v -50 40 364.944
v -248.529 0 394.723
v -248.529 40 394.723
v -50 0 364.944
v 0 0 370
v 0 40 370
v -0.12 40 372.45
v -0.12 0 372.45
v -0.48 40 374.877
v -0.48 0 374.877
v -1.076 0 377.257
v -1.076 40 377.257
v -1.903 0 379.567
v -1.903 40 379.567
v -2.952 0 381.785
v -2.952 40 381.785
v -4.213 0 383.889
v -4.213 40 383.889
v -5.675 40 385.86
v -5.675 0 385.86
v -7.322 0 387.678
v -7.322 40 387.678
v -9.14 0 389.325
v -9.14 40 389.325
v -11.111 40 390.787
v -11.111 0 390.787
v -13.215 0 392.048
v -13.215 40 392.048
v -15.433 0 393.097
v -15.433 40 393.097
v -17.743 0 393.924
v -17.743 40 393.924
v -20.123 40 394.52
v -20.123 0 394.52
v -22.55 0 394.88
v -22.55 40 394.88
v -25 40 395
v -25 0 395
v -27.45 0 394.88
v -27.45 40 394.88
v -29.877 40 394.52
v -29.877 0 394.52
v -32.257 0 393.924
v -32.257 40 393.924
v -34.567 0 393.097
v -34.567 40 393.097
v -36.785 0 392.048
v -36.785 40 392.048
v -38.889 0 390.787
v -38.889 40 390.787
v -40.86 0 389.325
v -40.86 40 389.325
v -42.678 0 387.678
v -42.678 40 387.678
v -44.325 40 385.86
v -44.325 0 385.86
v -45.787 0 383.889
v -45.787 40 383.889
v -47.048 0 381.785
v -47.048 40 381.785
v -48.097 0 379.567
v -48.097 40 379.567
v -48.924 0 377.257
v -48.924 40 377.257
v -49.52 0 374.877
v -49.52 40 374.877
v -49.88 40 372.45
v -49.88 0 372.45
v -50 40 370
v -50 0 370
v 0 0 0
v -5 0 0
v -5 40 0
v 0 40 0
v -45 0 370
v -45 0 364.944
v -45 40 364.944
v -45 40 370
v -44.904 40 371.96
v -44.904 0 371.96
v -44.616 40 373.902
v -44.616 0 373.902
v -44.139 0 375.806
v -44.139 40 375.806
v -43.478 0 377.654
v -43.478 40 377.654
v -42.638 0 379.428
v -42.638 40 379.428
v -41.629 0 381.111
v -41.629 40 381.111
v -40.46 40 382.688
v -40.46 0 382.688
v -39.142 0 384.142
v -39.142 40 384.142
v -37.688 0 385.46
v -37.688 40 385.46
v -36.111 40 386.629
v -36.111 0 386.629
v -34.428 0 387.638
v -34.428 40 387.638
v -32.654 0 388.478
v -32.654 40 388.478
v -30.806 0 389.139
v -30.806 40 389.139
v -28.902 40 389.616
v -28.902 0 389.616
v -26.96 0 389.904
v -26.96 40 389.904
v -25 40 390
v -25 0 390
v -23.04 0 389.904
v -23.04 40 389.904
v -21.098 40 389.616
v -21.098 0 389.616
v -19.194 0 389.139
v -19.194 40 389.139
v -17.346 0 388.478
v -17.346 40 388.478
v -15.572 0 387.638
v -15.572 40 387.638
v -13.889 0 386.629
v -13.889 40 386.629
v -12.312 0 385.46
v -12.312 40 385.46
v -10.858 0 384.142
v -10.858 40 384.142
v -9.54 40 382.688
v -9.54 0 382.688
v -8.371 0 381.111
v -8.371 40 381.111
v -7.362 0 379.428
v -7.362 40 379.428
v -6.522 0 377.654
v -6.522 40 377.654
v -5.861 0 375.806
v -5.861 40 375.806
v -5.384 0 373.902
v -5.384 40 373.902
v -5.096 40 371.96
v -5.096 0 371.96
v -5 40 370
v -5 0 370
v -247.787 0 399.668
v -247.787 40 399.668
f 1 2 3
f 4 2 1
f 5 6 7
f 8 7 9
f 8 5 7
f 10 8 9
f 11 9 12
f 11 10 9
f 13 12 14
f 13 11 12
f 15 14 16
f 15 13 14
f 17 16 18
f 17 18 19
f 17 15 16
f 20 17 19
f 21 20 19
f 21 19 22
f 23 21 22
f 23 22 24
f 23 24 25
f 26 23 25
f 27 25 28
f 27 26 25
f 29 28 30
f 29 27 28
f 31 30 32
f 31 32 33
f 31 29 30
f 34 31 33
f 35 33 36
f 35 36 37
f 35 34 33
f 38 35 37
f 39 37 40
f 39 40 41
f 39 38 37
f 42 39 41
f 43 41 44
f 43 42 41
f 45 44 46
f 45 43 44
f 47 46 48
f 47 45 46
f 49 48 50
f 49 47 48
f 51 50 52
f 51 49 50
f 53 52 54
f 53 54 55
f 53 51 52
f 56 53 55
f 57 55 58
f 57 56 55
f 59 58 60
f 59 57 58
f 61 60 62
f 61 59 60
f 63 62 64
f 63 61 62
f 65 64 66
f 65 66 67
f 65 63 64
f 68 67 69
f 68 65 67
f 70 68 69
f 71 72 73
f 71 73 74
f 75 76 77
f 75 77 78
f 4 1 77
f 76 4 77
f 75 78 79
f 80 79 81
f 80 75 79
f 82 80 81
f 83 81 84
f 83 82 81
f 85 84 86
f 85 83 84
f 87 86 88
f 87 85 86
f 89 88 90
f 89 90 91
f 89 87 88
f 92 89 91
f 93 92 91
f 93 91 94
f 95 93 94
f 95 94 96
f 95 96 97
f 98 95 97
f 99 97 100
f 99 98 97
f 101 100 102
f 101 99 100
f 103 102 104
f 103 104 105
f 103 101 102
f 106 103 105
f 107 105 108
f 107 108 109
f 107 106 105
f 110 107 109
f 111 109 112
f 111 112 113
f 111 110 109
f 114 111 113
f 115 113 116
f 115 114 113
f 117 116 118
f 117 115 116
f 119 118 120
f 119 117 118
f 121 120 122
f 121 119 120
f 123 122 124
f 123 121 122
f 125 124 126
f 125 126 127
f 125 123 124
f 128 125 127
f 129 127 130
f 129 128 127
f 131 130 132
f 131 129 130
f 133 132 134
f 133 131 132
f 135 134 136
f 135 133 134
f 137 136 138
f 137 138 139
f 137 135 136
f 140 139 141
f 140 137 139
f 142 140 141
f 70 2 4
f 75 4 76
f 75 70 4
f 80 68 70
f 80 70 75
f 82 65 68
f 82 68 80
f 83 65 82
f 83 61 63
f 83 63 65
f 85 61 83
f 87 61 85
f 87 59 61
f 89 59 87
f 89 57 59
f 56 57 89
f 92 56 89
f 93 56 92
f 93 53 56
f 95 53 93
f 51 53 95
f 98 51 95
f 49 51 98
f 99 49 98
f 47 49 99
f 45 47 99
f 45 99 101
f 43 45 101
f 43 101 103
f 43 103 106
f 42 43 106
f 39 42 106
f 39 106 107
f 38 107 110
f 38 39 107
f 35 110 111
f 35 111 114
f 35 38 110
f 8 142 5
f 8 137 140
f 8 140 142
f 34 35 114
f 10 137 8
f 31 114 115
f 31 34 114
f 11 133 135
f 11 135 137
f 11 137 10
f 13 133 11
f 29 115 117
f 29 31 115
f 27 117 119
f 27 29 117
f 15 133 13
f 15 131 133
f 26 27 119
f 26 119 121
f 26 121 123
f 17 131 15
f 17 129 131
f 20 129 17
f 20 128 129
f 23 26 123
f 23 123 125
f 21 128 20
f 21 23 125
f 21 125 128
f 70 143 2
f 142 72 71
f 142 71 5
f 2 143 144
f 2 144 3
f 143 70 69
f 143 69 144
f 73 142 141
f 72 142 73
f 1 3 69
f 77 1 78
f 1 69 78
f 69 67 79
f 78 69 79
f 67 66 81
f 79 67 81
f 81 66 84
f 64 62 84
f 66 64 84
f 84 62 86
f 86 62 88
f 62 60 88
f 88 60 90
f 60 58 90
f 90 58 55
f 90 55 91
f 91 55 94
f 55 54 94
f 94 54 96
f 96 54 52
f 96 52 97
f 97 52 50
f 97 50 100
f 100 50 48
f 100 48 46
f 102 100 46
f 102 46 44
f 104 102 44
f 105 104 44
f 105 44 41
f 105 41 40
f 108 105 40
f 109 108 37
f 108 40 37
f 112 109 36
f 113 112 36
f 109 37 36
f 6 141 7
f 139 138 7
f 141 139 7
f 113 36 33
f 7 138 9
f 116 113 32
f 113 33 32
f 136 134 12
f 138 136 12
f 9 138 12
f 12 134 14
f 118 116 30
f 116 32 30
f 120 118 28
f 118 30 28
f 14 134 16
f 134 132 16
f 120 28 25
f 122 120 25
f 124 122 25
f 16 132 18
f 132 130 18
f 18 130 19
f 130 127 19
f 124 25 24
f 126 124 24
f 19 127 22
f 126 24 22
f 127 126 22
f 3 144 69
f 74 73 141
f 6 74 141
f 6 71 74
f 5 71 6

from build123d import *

# Parameters (mm, degrees)
F1_DEPTH = 40


# Not quite as in the source:
# - ends of sketch curves that miss each other by under 0.0002 mm in the source are joined


with BuildPart() as f1:
    # F0 (on Front) → F1 (new body)
    with BuildSketch(Plane.XZ):
        with BuildLine():
            Line((-4.9999998882, 0), (0, 0))
            Line((0, 0), (0, 370))
            ThreePointArc((0, 370), (-25, 395), (-50, 370))
            Line((-50, 370), (-247.7872705737, 399.6680905861))
            Line((-247.7872705737, 399.6680905861), (-248.5289721923, 394.7234131282))
            Line((-248.5289721923, 394.7234131282), (-50, 364.9440672994))
            Line((-50, 364.9440672994), (-45, 364.9440672994))
            Line((-45, 364.9440672994), (-45, 370))
            ThreePointArc((-45, 370), (-25, 390), (-5, 370))
            Line((-5, 370), (-4.9999998882, 0))
        make_face()
    extrude(amount=-F1_DEPTH)


solid = f1.part
